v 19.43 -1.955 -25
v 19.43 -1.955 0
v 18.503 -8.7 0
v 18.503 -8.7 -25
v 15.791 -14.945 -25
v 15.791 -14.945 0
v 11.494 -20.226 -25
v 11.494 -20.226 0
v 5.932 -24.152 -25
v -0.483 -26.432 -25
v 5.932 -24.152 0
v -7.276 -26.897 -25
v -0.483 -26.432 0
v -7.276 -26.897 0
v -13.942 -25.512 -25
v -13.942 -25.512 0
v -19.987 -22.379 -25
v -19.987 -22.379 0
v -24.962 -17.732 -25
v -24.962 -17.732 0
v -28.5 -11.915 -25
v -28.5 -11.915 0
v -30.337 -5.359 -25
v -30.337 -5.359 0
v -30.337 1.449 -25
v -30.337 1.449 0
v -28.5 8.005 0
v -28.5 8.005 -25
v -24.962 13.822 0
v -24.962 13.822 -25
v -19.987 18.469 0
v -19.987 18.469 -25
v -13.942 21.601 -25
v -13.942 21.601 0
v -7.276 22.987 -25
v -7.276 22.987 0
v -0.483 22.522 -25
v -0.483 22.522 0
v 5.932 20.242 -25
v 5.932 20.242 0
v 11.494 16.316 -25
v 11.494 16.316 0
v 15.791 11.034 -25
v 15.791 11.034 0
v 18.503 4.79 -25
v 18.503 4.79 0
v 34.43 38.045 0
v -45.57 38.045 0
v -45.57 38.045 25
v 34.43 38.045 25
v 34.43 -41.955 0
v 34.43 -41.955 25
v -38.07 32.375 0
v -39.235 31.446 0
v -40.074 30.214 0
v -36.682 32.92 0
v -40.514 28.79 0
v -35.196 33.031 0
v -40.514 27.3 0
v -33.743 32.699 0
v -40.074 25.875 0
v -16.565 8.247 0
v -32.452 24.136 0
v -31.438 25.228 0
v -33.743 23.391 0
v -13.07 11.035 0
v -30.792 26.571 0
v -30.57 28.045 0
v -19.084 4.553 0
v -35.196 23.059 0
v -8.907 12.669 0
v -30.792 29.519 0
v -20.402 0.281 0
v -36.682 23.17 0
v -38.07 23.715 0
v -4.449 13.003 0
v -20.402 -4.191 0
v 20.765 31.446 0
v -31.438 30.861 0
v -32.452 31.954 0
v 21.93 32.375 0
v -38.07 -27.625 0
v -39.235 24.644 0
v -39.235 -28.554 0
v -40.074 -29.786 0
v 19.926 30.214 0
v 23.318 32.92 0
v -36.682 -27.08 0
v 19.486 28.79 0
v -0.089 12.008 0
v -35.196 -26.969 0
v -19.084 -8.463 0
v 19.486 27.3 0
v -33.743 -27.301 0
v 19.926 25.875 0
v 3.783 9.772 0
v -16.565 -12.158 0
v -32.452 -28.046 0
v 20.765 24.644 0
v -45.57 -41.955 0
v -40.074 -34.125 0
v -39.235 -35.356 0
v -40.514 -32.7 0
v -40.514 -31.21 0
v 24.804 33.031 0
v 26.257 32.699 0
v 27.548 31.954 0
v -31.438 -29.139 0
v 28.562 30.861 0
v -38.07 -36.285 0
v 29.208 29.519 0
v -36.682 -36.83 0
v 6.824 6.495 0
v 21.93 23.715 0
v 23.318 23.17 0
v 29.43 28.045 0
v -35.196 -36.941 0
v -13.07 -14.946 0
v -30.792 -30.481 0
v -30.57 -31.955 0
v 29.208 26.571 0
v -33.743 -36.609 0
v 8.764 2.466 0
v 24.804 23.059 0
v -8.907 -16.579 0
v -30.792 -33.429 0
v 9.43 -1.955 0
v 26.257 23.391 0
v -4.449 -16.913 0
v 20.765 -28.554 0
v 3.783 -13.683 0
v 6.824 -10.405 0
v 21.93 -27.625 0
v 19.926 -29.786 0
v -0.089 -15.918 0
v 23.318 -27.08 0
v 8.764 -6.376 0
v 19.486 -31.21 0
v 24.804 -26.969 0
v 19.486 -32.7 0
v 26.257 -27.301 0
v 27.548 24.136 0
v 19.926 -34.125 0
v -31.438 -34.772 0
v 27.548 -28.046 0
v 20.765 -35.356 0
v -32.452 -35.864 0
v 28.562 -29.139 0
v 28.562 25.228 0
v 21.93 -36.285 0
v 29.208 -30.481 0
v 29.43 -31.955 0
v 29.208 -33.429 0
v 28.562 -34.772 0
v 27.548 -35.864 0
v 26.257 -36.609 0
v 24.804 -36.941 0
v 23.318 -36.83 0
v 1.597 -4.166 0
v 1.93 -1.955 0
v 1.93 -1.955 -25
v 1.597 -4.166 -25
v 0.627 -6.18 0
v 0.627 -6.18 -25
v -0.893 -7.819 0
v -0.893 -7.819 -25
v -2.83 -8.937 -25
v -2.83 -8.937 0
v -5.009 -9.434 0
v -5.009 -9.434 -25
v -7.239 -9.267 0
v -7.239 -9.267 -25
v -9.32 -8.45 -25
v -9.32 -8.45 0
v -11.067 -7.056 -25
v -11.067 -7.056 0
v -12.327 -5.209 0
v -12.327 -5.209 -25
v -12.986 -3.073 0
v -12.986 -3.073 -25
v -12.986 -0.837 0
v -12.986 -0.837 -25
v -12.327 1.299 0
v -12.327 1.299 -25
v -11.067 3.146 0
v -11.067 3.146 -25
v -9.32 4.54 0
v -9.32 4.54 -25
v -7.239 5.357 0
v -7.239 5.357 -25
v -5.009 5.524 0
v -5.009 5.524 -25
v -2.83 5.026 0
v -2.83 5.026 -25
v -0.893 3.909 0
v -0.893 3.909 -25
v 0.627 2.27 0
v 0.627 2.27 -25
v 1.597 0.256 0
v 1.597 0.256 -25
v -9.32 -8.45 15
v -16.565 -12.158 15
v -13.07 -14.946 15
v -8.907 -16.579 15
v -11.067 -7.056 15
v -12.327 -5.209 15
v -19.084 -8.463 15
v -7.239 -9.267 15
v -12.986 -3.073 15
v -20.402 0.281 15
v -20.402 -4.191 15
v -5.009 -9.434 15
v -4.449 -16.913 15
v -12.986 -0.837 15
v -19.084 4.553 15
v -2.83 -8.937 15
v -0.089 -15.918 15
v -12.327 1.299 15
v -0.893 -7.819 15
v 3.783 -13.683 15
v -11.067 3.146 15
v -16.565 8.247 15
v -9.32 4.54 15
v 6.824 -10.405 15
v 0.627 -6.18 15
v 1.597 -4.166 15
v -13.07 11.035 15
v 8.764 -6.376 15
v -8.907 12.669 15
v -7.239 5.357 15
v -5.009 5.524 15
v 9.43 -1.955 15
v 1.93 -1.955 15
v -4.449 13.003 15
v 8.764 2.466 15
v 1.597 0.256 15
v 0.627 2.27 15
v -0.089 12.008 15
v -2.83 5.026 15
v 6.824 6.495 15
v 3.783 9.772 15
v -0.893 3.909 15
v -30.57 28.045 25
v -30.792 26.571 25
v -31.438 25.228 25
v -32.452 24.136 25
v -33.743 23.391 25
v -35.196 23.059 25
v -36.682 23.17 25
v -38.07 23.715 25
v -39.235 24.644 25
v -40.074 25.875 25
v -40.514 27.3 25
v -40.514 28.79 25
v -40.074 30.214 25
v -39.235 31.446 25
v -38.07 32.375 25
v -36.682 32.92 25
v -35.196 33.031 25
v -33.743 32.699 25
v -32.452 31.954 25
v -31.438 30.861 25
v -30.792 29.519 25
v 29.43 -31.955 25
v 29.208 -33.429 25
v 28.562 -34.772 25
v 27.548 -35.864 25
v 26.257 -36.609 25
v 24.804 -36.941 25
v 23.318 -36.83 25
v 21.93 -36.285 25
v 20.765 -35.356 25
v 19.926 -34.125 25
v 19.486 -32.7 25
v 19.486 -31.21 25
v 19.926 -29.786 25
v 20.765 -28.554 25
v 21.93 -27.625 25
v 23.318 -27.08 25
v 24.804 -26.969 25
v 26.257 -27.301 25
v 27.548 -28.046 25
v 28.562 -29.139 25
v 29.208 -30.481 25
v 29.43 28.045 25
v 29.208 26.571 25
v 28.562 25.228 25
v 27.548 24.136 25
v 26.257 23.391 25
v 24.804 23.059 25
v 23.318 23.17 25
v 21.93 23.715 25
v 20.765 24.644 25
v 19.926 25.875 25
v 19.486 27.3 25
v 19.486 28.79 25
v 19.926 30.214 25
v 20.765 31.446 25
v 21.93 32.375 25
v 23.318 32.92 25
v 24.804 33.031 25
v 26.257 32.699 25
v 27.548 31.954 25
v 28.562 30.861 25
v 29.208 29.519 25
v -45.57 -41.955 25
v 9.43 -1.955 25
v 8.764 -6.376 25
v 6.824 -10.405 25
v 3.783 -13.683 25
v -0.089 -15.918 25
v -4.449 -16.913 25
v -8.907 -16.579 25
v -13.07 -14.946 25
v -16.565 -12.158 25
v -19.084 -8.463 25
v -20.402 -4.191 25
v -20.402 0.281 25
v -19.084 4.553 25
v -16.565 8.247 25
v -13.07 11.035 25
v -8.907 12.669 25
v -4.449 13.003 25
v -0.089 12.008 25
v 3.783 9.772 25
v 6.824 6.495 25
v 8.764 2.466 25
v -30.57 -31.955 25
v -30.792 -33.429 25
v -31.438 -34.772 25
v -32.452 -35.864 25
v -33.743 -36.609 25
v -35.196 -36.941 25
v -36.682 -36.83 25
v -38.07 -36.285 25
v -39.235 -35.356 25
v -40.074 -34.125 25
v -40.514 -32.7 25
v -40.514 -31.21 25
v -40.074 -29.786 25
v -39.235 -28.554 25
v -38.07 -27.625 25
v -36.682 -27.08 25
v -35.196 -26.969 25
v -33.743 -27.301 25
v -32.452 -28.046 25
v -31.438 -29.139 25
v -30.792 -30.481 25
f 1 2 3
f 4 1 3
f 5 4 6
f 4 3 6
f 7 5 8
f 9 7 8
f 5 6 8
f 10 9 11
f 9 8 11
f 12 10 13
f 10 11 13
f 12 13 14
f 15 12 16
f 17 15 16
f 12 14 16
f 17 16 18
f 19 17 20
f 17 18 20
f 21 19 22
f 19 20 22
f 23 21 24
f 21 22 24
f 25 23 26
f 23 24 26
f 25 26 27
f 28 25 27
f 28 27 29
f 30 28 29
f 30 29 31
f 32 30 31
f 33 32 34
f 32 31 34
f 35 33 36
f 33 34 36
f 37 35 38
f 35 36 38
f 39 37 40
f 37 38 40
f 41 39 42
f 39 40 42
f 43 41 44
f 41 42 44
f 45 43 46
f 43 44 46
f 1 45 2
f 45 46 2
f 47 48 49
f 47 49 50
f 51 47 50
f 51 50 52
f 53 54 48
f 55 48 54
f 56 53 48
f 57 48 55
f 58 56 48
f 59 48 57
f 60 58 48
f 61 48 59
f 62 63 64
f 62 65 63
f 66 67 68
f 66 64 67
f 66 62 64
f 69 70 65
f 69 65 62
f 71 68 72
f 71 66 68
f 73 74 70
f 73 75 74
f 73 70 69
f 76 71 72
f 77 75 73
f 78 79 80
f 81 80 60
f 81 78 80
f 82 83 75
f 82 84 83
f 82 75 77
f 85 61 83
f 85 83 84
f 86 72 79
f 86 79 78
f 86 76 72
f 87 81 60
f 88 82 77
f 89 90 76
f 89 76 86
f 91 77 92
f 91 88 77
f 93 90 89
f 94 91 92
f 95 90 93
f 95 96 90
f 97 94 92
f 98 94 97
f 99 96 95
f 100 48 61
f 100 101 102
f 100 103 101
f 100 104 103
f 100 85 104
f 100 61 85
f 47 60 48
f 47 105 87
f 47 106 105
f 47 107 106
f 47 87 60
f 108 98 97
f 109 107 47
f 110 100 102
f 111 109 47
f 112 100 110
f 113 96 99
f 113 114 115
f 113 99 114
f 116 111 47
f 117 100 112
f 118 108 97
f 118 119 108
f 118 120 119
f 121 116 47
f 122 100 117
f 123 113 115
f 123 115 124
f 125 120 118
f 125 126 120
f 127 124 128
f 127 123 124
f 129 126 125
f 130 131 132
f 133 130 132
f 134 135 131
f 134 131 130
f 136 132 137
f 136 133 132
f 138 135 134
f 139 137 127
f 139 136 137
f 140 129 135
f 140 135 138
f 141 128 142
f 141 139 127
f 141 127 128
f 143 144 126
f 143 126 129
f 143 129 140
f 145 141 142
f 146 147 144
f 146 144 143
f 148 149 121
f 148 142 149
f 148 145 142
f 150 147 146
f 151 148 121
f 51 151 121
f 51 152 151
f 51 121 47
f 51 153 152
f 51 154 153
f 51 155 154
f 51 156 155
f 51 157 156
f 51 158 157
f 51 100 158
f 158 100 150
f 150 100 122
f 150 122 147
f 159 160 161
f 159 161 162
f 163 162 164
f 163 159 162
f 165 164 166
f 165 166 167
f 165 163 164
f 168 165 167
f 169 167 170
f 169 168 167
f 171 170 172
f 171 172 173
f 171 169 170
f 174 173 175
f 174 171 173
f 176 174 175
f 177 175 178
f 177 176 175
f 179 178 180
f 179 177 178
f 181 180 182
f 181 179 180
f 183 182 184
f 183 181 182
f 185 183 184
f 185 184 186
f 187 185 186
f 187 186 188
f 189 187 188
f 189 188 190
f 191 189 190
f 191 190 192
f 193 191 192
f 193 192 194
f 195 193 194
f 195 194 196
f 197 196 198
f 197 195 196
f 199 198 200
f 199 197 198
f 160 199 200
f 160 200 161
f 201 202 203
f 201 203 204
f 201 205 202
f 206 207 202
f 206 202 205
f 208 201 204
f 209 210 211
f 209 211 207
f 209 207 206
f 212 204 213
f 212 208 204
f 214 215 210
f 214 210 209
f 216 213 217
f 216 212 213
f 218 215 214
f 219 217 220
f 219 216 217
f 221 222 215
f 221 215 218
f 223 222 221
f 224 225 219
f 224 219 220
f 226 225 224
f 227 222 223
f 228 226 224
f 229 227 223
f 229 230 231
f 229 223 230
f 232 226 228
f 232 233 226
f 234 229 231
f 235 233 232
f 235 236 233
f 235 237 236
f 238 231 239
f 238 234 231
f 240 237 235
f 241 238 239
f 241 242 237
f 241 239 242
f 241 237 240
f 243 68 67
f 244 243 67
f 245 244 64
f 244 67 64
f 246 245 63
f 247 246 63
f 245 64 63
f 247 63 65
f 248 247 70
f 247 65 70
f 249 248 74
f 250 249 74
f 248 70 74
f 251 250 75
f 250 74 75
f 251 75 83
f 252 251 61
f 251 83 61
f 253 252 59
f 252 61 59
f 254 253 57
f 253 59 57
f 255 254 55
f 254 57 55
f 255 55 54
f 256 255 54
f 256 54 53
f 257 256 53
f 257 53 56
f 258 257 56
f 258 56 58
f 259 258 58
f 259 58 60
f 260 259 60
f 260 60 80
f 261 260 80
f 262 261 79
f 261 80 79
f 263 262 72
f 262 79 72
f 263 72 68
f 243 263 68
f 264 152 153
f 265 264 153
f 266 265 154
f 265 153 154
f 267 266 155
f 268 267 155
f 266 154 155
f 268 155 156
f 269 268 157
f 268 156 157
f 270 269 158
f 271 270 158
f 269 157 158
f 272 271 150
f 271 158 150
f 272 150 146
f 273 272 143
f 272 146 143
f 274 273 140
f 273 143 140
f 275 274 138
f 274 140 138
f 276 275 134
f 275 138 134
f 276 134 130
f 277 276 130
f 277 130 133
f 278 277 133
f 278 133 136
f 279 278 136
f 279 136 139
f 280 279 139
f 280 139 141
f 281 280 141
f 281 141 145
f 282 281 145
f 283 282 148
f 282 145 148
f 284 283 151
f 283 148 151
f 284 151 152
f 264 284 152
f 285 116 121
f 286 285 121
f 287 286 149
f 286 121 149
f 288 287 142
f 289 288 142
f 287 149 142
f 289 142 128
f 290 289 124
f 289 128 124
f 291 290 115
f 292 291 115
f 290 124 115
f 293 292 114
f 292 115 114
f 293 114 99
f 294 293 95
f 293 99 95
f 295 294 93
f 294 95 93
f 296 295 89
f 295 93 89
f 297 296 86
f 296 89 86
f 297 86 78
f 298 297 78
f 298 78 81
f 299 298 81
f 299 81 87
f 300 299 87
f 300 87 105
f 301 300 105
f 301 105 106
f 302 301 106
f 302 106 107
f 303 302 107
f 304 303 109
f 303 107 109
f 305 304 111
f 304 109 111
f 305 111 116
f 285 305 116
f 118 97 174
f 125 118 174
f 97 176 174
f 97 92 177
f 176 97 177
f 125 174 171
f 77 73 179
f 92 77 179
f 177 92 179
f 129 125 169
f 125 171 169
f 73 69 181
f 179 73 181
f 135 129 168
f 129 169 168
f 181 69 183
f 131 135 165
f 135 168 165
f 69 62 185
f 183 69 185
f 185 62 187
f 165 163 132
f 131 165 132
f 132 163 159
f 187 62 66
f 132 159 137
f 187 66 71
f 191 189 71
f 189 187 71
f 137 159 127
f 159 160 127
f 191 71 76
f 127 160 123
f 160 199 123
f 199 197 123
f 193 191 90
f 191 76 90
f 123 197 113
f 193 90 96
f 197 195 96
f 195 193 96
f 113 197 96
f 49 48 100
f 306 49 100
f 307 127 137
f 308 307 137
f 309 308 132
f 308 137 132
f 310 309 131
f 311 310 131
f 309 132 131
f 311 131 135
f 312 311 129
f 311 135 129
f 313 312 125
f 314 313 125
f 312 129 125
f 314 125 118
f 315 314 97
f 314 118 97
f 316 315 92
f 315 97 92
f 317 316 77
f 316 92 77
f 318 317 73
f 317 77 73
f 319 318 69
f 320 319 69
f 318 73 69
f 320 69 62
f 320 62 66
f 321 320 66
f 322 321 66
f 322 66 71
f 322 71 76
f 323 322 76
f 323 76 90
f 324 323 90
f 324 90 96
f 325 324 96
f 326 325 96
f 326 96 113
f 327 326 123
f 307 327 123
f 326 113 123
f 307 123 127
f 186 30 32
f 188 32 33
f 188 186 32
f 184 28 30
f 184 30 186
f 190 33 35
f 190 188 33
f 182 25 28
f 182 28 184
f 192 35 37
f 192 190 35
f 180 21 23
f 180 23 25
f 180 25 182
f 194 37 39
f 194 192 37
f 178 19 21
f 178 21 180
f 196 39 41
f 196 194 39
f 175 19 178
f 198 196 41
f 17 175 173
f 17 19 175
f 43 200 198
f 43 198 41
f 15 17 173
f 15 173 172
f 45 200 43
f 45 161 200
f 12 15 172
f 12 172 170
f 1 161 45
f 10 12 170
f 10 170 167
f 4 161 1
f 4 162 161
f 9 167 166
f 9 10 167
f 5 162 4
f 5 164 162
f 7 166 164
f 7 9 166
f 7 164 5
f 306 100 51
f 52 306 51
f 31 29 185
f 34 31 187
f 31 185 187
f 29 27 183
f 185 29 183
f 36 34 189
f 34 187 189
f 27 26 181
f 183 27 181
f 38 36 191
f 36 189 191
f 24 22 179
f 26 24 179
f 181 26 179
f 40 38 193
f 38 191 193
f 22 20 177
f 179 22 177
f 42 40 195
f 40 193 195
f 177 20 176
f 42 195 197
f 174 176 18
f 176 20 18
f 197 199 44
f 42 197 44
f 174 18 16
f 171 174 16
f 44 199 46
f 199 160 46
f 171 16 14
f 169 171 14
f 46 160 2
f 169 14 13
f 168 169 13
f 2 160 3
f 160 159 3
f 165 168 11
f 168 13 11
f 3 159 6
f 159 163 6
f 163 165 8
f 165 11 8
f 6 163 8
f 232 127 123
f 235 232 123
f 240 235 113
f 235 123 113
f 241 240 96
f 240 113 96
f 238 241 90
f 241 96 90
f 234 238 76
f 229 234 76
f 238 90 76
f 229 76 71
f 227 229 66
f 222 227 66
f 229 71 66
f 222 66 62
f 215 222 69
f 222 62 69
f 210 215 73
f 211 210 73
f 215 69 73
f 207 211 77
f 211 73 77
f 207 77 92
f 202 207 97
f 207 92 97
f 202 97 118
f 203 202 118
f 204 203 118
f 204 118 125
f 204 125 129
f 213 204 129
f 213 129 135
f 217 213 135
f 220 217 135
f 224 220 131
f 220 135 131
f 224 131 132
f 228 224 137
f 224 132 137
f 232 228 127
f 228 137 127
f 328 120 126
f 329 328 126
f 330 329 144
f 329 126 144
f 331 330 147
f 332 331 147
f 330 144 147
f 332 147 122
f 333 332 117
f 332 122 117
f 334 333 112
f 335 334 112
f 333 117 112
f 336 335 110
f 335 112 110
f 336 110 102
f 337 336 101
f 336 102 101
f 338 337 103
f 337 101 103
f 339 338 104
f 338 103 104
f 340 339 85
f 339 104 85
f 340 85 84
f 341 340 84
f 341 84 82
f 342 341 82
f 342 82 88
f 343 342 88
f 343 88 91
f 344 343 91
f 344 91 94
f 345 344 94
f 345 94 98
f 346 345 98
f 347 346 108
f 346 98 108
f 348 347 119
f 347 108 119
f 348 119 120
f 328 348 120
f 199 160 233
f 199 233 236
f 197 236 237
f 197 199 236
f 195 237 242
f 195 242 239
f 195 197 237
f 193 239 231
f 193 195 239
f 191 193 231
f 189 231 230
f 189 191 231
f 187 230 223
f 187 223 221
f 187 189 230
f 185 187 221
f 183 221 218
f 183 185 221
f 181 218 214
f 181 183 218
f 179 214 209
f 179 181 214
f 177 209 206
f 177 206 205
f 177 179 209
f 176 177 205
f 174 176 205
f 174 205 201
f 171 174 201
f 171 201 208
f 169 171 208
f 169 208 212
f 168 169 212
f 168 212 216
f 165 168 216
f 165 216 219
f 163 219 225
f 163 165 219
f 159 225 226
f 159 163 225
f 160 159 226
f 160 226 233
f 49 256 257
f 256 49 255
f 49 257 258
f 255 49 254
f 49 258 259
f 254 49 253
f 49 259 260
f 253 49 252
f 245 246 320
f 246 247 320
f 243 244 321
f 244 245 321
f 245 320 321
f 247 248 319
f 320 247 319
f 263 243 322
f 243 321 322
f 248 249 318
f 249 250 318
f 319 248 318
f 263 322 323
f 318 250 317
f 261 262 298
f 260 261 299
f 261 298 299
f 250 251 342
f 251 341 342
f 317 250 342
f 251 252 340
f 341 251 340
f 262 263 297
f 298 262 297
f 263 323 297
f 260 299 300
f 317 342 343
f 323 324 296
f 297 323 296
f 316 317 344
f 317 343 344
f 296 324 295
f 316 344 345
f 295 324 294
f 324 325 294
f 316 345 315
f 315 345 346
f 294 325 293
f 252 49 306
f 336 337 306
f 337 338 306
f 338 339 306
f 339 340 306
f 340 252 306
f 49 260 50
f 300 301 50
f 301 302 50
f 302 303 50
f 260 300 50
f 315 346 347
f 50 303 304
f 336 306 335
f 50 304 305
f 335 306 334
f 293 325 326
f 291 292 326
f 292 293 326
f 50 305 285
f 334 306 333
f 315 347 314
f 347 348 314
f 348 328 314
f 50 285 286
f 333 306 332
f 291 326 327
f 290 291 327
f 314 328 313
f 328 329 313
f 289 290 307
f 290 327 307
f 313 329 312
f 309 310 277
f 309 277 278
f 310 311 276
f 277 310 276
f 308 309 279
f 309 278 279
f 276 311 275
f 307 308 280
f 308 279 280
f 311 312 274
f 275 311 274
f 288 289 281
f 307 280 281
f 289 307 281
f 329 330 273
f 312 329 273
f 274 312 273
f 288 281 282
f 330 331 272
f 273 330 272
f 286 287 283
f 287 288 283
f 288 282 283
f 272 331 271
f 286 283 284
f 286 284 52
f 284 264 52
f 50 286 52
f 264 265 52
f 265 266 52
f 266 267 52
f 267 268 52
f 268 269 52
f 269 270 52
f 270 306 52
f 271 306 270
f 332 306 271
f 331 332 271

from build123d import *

# Parameters (mm, degrees)
F0_R     = 15
F0_R_2   = 7.5
F1_DEPTH = 15
F2_W     = 80
F2_H     = 80
F2_R     = 5
F2_R_2   = 15
F3_DEPTH = 25
F4_R     = 25
F4_R_2   = 7.5
F5_DEPTH = 25


# Not quite as in the source:
# - a feature names something its author has since deleted; it is built from what else it names


with BuildPart() as f1:
    # F0 (on Top) → F1 (new body)
    with BuildSketch(Plane.XY):
        with Locations((-5.5696061254, -1.9551310688)):
            Circle(F0_R)
        with Locations((-5.5696061254, -1.9551310688)):
            Circle(F0_R_2, mode=Mode.SUBTRACT)
    extrude(amount=F1_DEPTH)


with BuildPart() as f3:
    # F2 (on face) → F3 (new body)
    with BuildSketch(Plane(origin=(0, 0, 0), x_dir=(1, 0, 0), z_dir=(0, 0, -1))):
        with Locations((-5.5696061254, 1.9551310688)):
            Rectangle(F2_W, F2_H)
        with Locations((-35.5696061254, -28.0448689312)):
            Circle(F2_R, mode=Mode.SUBTRACT)
        with Locations((24.4303938746, -28.0448689312)):
            Circle(F2_R, mode=Mode.SUBTRACT)
        with Locations((-35.5696061254, 31.9551310688)):
            Circle(F2_R, mode=Mode.SUBTRACT)
        with Locations((-5.5696061254, 1.9551310688)):
            Circle(F2_R_2, mode=Mode.SUBTRACT)
        with Locations((24.4303938746, 31.9551310688)):
            Circle(F2_R, mode=Mode.SUBTRACT)
    extrude(amount=-F3_DEPTH)


with BuildPart() as f5:
    # F4 (on face) → F5 (new body)
    with BuildSketch(Plane(origin=(0, 0, 0), x_dir=(1, 0, 0), z_dir=(0, 0, -1))):
        with Locations((-5.5696061254, 1.9551310688)):
            Circle(F4_R)
        with Locations((-5.5696061254, 1.9551310688)):
            Circle(F4_R_2, mode=Mode.SUBTRACT)
    extrude(amount=F5_DEPTH)


solid = Compound([f1.part, f3.part, f5.part])
